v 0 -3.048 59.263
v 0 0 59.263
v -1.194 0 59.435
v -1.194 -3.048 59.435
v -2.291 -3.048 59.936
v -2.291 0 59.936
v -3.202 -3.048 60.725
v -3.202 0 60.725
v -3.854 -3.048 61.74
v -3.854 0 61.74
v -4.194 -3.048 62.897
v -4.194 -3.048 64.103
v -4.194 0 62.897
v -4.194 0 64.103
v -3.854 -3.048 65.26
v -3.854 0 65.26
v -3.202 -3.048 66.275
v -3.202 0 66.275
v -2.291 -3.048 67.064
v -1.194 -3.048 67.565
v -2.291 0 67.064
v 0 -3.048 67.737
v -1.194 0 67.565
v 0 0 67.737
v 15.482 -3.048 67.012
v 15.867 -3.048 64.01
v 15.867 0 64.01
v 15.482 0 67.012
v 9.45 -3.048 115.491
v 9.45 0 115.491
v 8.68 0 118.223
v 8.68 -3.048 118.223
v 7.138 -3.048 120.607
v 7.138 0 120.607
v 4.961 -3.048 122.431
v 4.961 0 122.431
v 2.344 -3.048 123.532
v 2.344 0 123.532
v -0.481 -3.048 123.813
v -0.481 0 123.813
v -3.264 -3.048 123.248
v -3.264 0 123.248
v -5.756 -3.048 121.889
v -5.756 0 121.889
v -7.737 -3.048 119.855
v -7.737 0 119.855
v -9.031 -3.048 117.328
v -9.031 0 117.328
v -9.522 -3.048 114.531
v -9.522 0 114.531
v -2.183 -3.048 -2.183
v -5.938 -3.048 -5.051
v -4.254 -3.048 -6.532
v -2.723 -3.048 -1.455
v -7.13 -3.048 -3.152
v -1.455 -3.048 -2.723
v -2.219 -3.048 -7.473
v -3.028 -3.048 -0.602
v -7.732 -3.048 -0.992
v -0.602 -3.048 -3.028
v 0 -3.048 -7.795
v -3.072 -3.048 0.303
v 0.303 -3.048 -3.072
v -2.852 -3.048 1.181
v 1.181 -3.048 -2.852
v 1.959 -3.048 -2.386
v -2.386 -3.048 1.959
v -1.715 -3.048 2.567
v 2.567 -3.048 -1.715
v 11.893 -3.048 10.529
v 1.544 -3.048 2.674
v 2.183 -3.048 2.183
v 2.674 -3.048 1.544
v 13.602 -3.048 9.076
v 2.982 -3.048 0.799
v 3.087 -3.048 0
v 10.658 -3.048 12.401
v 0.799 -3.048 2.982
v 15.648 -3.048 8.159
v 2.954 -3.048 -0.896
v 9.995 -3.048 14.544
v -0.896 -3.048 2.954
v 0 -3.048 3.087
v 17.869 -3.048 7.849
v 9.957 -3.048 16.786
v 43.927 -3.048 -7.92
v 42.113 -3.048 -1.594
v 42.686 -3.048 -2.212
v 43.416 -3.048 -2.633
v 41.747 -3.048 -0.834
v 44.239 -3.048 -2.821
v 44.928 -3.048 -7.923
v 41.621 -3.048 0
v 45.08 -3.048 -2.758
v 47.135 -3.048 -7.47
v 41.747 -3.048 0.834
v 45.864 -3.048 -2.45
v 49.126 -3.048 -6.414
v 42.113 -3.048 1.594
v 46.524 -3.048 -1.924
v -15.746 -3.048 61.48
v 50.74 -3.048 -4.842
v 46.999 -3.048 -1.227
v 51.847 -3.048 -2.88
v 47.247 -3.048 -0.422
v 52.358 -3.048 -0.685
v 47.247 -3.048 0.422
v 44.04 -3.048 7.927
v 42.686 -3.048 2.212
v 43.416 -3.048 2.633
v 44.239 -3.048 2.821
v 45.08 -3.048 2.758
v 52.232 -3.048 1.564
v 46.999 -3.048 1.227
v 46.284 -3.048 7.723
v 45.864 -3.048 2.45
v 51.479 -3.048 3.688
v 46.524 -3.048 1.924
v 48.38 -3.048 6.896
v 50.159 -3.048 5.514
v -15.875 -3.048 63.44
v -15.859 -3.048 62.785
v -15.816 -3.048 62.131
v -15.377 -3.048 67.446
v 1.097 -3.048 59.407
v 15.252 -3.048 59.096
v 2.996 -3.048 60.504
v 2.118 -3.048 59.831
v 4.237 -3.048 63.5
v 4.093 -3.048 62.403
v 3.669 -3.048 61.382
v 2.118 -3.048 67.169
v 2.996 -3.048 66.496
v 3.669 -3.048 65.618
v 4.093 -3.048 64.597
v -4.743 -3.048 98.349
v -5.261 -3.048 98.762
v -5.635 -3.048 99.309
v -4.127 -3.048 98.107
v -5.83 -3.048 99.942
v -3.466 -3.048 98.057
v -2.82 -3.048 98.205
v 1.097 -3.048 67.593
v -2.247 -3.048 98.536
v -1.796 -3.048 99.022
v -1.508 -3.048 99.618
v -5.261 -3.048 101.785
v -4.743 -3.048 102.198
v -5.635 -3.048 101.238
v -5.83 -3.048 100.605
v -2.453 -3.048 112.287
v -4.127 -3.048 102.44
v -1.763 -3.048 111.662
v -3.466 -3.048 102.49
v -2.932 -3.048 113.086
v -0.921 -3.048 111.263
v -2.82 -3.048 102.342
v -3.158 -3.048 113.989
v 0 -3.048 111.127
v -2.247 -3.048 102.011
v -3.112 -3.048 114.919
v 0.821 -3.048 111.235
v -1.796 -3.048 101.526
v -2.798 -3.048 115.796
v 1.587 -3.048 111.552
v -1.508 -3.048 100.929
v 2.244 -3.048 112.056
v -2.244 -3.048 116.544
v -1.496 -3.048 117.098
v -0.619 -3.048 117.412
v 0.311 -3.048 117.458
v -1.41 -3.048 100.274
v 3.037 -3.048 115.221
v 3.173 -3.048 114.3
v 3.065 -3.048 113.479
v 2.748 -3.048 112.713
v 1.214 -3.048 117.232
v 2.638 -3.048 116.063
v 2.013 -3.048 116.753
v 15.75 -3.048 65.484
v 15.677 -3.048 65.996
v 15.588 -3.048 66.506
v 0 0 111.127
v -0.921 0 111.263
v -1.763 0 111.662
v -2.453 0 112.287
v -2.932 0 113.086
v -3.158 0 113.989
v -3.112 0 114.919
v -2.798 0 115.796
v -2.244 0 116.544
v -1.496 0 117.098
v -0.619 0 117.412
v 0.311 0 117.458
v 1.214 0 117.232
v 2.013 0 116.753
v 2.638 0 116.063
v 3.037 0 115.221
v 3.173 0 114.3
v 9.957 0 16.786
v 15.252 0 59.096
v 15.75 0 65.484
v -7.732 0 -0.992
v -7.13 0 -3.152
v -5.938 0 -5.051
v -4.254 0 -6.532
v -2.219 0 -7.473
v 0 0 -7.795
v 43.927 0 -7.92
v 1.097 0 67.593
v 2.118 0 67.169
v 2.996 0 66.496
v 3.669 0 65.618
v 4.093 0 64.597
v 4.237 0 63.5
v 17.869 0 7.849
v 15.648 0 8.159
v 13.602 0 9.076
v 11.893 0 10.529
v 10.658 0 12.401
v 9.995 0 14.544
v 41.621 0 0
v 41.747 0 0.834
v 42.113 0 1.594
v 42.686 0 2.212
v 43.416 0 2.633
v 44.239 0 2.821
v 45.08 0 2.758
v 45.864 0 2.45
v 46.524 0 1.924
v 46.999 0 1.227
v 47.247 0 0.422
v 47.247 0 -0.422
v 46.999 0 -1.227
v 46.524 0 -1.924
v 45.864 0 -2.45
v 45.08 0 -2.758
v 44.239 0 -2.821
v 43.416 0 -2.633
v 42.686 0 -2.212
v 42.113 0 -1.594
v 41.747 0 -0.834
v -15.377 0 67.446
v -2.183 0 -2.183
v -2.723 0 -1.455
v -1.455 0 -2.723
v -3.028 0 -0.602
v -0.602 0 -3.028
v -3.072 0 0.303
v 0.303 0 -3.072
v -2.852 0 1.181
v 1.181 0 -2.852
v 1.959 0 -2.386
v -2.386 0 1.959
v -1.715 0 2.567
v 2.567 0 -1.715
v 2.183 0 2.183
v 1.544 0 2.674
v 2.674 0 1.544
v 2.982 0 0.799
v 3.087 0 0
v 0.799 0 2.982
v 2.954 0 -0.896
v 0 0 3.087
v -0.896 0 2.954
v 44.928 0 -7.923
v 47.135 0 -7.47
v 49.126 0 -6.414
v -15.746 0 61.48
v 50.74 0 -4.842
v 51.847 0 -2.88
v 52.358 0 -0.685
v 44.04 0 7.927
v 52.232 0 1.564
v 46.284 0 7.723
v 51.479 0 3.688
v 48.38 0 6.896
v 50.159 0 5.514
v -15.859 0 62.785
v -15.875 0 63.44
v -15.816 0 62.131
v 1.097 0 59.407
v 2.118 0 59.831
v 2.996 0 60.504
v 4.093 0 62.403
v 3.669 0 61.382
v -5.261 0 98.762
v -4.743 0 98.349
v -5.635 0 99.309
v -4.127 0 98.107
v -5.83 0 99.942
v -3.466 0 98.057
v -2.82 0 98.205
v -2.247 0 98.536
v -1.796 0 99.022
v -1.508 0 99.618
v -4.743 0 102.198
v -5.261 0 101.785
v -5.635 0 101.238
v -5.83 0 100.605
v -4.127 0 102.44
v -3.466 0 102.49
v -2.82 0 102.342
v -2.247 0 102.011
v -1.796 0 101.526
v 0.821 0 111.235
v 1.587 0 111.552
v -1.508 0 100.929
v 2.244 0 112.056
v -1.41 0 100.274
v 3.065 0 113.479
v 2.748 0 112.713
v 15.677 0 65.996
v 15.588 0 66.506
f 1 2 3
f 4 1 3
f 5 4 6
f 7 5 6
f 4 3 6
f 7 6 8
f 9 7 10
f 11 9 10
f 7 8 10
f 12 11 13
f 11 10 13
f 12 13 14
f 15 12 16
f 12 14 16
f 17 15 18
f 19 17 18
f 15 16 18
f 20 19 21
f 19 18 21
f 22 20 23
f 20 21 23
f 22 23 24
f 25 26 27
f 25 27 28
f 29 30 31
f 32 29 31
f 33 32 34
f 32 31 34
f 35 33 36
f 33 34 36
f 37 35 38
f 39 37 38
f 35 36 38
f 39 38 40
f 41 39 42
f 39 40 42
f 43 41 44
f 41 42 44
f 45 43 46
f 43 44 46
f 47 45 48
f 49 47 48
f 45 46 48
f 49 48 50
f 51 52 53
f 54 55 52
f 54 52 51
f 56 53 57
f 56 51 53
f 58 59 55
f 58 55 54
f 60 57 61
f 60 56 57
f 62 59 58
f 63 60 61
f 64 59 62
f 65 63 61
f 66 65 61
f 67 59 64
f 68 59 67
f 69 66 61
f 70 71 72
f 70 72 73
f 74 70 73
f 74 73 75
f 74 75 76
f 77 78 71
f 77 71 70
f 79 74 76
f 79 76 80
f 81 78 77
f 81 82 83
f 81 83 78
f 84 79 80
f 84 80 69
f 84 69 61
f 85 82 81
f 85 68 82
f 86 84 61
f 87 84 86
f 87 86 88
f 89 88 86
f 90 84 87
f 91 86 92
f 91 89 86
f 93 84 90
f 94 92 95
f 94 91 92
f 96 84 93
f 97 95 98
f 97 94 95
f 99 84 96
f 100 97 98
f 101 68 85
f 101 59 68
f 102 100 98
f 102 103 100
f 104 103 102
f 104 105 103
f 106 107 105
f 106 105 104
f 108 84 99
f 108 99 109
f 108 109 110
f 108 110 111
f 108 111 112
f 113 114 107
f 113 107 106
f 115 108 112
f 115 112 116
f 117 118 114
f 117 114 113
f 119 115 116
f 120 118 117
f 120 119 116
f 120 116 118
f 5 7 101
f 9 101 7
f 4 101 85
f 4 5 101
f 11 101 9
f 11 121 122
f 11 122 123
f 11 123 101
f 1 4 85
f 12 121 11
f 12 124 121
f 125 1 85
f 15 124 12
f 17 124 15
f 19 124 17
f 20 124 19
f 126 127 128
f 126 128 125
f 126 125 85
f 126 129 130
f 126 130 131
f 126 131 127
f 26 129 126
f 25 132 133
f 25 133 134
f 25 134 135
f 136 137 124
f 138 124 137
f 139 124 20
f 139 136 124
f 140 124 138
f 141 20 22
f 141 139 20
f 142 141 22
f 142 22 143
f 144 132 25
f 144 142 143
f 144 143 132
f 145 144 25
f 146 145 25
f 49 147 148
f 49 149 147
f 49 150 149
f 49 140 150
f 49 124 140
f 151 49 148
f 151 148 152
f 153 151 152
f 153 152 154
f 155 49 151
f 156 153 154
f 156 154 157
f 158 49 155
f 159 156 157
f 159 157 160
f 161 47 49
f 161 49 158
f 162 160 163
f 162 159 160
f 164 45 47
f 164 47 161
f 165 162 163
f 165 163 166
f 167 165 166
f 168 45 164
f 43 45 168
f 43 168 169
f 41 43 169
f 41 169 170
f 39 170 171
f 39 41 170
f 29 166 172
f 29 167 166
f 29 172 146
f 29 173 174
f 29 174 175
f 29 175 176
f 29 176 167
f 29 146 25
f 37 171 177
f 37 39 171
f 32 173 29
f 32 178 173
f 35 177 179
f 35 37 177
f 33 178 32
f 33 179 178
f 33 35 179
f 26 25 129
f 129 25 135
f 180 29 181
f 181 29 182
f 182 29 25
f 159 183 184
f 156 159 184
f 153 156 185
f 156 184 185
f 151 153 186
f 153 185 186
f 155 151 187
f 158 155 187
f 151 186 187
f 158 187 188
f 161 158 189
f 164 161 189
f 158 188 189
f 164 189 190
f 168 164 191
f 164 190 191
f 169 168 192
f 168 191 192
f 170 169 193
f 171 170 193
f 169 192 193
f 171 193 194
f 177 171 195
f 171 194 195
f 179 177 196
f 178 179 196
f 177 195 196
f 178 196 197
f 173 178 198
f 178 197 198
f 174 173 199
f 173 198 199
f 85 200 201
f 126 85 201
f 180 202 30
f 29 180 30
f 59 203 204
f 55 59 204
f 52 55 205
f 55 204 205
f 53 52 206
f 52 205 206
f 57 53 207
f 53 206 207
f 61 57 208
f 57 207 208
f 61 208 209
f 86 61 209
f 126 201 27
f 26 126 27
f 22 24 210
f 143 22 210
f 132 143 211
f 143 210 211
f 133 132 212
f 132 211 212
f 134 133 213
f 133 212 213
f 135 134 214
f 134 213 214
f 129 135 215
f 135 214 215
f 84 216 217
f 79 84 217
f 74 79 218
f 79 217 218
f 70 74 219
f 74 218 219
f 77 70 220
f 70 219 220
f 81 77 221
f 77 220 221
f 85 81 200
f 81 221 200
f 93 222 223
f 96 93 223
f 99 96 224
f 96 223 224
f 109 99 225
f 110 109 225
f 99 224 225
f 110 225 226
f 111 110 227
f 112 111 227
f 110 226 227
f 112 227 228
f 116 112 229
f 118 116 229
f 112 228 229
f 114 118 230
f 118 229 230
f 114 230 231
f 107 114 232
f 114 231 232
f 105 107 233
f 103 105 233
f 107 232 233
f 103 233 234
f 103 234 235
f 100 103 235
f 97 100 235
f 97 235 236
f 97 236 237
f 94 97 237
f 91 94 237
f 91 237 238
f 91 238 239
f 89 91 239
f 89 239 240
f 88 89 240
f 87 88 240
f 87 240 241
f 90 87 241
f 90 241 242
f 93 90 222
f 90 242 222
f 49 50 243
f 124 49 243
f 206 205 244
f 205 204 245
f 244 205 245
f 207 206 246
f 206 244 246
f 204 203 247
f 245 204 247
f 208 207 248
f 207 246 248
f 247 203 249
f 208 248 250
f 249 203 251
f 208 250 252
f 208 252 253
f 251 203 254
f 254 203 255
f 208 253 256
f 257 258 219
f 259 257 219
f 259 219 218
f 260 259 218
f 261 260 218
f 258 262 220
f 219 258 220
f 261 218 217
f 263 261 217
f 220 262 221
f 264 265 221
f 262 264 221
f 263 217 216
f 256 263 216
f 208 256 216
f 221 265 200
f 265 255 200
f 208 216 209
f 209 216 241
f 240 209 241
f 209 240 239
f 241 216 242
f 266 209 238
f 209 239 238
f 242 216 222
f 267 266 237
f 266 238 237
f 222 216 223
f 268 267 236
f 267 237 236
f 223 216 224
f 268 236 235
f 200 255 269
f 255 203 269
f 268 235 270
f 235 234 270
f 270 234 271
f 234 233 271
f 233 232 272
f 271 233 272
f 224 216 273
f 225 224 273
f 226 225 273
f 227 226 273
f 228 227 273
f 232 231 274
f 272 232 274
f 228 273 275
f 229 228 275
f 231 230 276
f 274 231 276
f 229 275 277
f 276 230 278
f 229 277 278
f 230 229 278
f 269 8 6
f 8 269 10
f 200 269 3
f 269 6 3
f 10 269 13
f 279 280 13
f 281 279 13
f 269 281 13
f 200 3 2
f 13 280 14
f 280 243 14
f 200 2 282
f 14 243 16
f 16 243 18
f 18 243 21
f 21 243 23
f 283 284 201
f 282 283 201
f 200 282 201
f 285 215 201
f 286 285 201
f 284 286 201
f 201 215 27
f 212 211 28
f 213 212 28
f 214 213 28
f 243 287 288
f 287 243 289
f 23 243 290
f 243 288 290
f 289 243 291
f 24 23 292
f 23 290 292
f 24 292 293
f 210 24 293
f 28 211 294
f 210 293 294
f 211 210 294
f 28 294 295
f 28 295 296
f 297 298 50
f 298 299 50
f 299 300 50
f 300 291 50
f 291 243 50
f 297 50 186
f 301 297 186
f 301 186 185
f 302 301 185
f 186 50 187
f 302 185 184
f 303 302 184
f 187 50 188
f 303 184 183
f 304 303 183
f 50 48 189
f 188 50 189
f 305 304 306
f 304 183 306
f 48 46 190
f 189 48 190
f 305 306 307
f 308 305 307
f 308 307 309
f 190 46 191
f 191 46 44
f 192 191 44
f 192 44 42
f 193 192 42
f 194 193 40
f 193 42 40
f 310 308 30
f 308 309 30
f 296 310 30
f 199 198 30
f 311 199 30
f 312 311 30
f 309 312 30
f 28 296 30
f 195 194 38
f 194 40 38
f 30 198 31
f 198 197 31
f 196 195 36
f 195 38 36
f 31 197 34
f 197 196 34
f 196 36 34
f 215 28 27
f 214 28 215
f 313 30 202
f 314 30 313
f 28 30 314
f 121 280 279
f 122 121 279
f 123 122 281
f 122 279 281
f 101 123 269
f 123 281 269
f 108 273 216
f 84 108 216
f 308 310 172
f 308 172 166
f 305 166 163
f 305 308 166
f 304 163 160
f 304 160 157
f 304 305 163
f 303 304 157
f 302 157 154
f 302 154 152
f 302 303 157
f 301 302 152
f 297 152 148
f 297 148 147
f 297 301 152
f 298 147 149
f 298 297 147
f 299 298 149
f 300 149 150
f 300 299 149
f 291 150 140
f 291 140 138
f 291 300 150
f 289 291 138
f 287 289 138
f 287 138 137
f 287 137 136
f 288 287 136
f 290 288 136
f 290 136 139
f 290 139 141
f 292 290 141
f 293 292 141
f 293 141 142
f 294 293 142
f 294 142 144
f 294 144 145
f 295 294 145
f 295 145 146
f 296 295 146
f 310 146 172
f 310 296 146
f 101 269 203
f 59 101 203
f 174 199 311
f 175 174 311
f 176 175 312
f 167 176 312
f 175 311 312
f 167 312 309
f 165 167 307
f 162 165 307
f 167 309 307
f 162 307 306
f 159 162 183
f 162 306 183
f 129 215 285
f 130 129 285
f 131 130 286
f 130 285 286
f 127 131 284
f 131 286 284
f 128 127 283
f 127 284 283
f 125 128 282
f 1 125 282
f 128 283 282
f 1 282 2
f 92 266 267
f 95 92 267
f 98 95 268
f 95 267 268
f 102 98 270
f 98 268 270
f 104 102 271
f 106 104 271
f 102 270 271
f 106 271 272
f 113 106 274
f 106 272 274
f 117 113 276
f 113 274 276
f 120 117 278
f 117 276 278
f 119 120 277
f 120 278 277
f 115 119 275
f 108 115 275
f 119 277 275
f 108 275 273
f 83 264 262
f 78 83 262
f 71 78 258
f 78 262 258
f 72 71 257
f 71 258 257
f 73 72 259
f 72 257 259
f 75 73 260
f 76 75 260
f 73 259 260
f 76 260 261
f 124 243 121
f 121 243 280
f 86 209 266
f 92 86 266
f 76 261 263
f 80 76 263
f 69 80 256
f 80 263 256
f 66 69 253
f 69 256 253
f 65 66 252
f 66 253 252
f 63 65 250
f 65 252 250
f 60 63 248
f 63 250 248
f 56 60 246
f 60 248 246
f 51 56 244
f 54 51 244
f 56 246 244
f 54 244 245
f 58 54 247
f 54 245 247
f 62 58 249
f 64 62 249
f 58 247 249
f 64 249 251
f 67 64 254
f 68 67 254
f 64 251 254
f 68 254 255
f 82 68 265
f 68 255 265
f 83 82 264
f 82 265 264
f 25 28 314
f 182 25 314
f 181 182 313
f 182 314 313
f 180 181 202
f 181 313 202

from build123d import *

# Parameters (mm, degrees)
F0_R     = 2.2225
F1_DEPTH = 3.048


# Not quite as in the source:
# - ends of sketch curves that miss each other by under 0.0002 mm in the source are joined


with BuildPart() as f1:
    # F0 (on Front) → F1 (new body)
    with BuildSketch(Plane.XZ):
        with BuildLine():
            Line((0, 104.775), (0, 79.375))
            ThreePointArc((0, 79.375), (9.9062001273, 75.9049515935), (15.4816923534, 67.0118124772))
            ThreePointArc((15.4816923534, 67.0118124772), (15.634754331, 66.2513782015), (15.7504882737, 65.484375))
            Line((15.7504882737, 65.484375), (9.4502929642, 115.490625))
            ThreePointArc((9.4502929642, 115.490625), (9.5063048942, 114.896483242), (9.525, 114.3))
            ThreePointArc((9.525, 114.3), (6.7351920908, 107.5648079092), (0, 104.775))
        make_face()
        with BuildLine():
            ThreePointArc((-15.3768101201, 67.4457997325), (-9.7307773134, 76.0430298523), (0, 79.375))
            Line((0, 79.375), (0, 104.775))
            ThreePointArc((0, 104.775), (-6.8164586923, 107.6470671207), (-9.5221925783, 114.5312433813))
            Line((-9.5221925783, 114.5312433813), (-15.3768101201, 67.4457997325))
        make_face()
        with Locations((-3.6322334781, 100.2735868096)):
            Circle(F0_R, mode=Mode.SUBTRACT)
        with BuildLine():
            ThreePointArc((-9.5221925783, 114.5312433813), (-6.8164586923, 107.6470671207), (0, 104.775))
            ThreePointArc((0, 104.775), (6.7351920908, 107.5648079092), (9.525, 114.3))
            ThreePointArc((9.525, 114.3), (9.5063048942, 114.896483242), (9.4502929642, 115.490625))
            ThreePointArc((9.4502929642, 115.490625), (-0.481036029, 123.8128454912), (-9.5221925783, 114.5312433813))
        make_face()
        with BuildLine():
            ThreePointArc((3.1731383542, 114.3), (2.2437476479, 112.0562523521), (0, 111.1268616458))
            ThreePointArc((0, 111.1268616458), (-2.2437476479, 116.5437476479), (3.1731383542, 114.3))
        make_face(mode=Mode.SUBTRACT)
        with BuildLine():
            Line((0, 59.2630050683), (0, 47.625))
            ThreePointArc((0, 47.625), (9.5420870367, 50.8128332563), (15.2519117252, 59.0960456714))
            Line((15.2519117252, 59.0960456714), (15.8668198703, 64.0095607934))
            Line((15.8668198703, 64.0095607934), (15.4816923534, 67.0118124772))
            ThreePointArc((15.4816923534, 67.0118124772), (9.9062001273, 75.9049515935), (0, 79.375))
            Line((0, 79.375), (0, 67.7369949317))
            ThreePointArc((0, 67.7369949317), (2.996007848, 66.496007848), (4.2369949317, 63.5))
            ThreePointArc((4.2369949317, 63.5), (2.996007848, 60.503992152), (0, 59.2630050683))
        make_face()
        with BuildLine():
            ThreePointArc((-15.7459735632, 61.4801134818), (-10.4868948341, 51.5819187057), (0, 47.625))
            Line((0, 47.625), (0, 59.2630050683))
            ThreePointArc((0, 59.2630050683), (-4.2369949317, 63.5), (0, 67.7369949317))
            Line((0, 67.7369949317), (0, 79.375))
            ThreePointArc((0, 79.375), (-9.7307773134, 76.0430298523), (-15.3768101201, 67.4457997325))
            Line((-15.3768101201, 67.4457997325), (-15.8748867846, 63.4400452066))
            ThreePointArc((-15.8748867846, 63.4400452066), (-15.8407712999, 62.4580836766), (-15.7459735632, 61.4801134818))
        make_face()
        with BuildLine():
            ThreePointArc((-7.7320952095, -0.9918697506), (-5.8524002287, 5.1496129461), (0, 7.7954539272))
            Line((0, 7.7954539272), (0, 47.625))
            ThreePointArc((0, 47.625), (-10.4868948341, 51.5819187057), (-15.7459735632, 61.4801134818))
            Line((-15.7459735632, 61.4801134818), (-7.7320952095, -0.9918697506))
        make_face()
        with BuildLine():
            Line((0, 47.625), (0, 7.7954539272))
            ThreePointArc((0, 7.7954539272), (5.5122183343, 5.5122183343), (7.7954539272, 0))
            Line((7.7954539272, 0), (36.5125, 0))
            ThreePointArc((36.5125, 0), (38.6941635505, 5.4657344444), (44.0398708389, 7.9268972695))
            Line((44.0398708389, 7.9268972695), (17.869380753, 7.8488082918))
            ThreePointArc((17.869380753, 7.8488082918), (11.8930439791, 10.5290526777), (9.9569931381, 16.7862100471))
            Line((9.9569931381, 16.7862100471), (15.2519117252, 59.0960456714))
            ThreePointArc((15.2519117252, 59.0960456714), (9.5420870367, 50.8128332563), (0, 47.625))
        make_face()
        with BuildLine():
            Line((36.5125, 0), (7.7954539272, 0))
            ThreePointArc((7.7954539272, 0), (5.5122183343, -5.5122183343), (0, -7.7954539272))
            Line((0, -7.7954539272), (43.9269950713, -7.9202507596))
            ThreePointArc((43.9269950713, -7.9202507596), (38.6553793104, -5.4245992768), (36.5125, 0))
        make_face()
        with BuildLine():
            ThreePointArc((3.0872431229, 0), (-2.1830105474, -2.1830105474), (0, 3.0872431229))
            Line((0, 3.0872431229), (0, 7.7954539272))
            ThreePointArc((0, 7.7954539272), (-5.8524002287, 5.1496129461), (-7.7320952095, -0.9918697506))
            ThreePointArc((-7.7320952095, -0.9918697506), (-5.1496129461, -5.8524002287), (0, -7.7954539272))
            ThreePointArc((0, -7.7954539272), (5.5122183343, -5.5122183343), (7.7954539272, 0))
            Line((7.7954539272, 0), (3.0872431229, 0))
        make_face()
        with BuildLine():
            Line((0, 7.7954539272), (0, 3.0872431229))
            ThreePointArc((0, 3.0872431229), (2.1830105474, 2.1830105474), (3.0872431229, 0))
            Line((3.0872431229, 0), (7.7954539272, 0))
            ThreePointArc((7.7954539272, 0), (5.5122183343, 5.5122183343), (0, 7.7954539272))
        make_face()
        with BuildLine():
            ThreePointArc((44.0398708389, 7.9268972695), (38.6941635505, 5.4657344444), (36.5125, 0))
            ThreePointArc((36.5125, 0), (38.6553793104, -5.4245992768), (43.9269950713, -7.9202507596))
            Line((43.9269950713, -7.9202507596), (44.9280052412, -7.9230939184))
            ThreePointArc((44.9280052412, -7.9230939184), (50.2291899455, -5.4410357308), (52.3875, 0))
            ThreePointArc((52.3875, 0), (49.9157344444, 5.7558364495), (44.0398708389, 7.9268972695))
        make_face()
        with BuildLine():
            ThreePointArc((47.2789731749, 0), (44.45, -2.8289731749), (41.6210268251, 0))
            ThreePointArc((41.6210268251, 0), (44.45, 2.8289731749), (47.2789731749, 0))
        make_face(mode=Mode.SUBTRACT)
    extrude(amount=F1_DEPTH)


solid = f1.part
